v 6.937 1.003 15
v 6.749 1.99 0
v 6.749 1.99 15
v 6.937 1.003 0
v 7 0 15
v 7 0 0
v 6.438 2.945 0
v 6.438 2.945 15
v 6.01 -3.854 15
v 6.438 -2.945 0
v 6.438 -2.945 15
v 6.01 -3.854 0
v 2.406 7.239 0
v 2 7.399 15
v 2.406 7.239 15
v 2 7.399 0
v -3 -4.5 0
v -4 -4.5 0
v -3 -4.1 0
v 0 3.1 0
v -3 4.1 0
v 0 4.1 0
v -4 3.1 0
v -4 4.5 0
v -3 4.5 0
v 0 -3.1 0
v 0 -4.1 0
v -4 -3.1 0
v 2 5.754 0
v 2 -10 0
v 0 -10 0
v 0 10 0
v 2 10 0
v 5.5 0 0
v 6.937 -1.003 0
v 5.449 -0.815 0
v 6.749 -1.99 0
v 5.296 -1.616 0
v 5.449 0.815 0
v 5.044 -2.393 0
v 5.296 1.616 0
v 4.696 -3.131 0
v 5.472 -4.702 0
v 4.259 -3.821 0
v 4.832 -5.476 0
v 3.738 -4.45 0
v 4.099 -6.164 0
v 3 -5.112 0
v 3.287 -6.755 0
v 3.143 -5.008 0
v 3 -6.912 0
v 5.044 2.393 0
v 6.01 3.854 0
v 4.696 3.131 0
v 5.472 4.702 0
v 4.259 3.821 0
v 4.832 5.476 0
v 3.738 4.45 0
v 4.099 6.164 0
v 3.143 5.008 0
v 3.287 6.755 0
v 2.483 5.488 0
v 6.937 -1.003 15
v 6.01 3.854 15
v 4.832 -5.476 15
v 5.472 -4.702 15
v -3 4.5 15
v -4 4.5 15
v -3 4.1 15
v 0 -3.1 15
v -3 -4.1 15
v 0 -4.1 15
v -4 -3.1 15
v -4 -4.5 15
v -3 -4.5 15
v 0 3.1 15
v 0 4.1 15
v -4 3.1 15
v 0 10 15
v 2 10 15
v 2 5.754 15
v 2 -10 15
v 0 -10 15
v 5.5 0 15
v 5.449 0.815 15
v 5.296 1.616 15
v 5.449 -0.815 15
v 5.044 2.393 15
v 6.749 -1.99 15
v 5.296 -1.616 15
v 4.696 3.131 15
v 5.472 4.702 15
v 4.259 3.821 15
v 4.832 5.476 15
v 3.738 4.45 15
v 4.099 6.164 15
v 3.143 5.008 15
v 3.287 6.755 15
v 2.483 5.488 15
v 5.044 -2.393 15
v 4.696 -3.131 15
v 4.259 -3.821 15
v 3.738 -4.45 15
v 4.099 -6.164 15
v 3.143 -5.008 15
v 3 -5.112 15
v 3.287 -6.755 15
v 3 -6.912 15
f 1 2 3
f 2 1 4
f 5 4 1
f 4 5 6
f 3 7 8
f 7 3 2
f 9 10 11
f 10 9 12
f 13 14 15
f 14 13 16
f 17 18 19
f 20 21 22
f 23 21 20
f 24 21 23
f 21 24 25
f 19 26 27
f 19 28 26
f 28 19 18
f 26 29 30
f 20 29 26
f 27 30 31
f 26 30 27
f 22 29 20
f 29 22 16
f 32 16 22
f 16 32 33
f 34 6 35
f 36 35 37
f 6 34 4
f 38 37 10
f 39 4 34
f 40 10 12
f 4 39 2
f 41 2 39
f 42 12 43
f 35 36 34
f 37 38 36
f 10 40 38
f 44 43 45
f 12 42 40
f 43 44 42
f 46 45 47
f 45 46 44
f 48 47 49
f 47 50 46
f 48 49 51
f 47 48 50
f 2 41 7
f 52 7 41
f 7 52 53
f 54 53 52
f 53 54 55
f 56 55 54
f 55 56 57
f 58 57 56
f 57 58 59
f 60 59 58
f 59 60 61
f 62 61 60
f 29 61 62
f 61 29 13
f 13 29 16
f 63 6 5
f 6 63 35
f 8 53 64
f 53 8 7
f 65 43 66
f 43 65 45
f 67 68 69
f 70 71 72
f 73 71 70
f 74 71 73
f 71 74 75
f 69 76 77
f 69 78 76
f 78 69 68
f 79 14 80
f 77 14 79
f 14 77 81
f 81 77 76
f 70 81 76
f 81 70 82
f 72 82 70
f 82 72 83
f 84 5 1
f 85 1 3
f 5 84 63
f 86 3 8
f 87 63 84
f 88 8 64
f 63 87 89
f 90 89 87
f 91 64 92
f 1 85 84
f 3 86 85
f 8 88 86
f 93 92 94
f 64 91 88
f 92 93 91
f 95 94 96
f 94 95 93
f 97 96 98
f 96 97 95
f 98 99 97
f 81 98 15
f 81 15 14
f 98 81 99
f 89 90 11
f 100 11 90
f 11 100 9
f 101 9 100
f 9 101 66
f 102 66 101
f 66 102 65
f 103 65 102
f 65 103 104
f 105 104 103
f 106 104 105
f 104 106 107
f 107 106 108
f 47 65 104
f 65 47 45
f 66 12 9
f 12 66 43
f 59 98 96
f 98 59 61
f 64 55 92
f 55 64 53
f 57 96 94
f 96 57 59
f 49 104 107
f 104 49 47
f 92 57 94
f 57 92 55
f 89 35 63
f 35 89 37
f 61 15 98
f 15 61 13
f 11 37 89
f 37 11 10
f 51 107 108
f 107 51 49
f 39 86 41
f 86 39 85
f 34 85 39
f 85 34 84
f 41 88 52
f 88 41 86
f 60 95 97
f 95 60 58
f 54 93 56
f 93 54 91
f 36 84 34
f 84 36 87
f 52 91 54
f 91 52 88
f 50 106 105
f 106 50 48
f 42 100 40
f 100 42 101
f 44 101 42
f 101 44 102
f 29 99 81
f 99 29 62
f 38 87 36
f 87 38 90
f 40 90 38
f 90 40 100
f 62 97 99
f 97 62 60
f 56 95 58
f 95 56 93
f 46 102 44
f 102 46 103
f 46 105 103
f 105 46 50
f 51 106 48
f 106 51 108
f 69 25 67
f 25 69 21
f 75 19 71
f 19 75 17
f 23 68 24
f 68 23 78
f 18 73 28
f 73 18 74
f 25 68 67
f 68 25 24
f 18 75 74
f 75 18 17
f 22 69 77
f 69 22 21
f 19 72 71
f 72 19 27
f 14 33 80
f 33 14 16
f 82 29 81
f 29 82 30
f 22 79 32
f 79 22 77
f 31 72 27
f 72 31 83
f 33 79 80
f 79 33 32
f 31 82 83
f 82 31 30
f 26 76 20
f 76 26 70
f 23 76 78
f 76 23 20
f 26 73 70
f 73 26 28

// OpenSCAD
// file: ../src/lib/ALU_profile.scad
// Aleksandr Saechnikov 09 june 2015

ALU_profile(height=100, size=30);

module ALU_profile(size=30, height=10, radius=1.5, step=0.5) {
    echo(height);

	linear_extrude(height=height) {
		union() {
			sub_extrusion_profile(size, radius, step);
			rotate([0,0,90])  sub_extrusion_profile(size, radius, step);
			rotate([0,0,180]) sub_extrusion_profile(size, radius, step);
			rotate([0,0,270]) sub_extrusion_profile(size, radius, step);
		}
	}
    
    module sub_extrusion_profile(size=30, radius = 1.5, step=0.5) {

        reSize = size/30; // Scalling

        k0 = 0;
        k2 = 3.65*reSize;
        k1 = k2*cos(45);

        k3 = 4*reSize;
        k4 = 6*reSize;
        k5 = 8.25*reSize; k5_2 = k5 + k4 - k3;
        k6 = 12.8*reSize;
        k7 = 15*reSize;

        _radius = radius;// OR  *reSize -- Corner radius
        _step = step;    // OR  *reSize -- Step size

        polygon(points=[
            [k1,k1],[0,k2], // Center hole
            [0,k4],[k3,k4],[k5,k5_2],[k5,k6],[k3,k6],
            [k3,k7-_step],[k3+_step,k7-_step],[k3+_step,k7], //Step
            [k7-_radius,k7],[k7-_radius*(1.-cos(45)),k7-_radius*(1.-cos(45))],[k7,k7-_radius],// Corner
            [k7,k3+_step],[k7-_step,k3+_step],[k7-_step,k3], // Step
            [k6,k3],[k6,k5],[k5_2,k5],[k4,k3],[k4,0],
            [k2,0]  // Center hole
        ]);
    }
}
// file: ../src/888_5013.scad
include <../parameters.scad>
use <./lib/ALU_profile.scad>

module 888_5013() {
    difference() {
        union() {
            translate([-1/2-3, 0, 15/2])
            cube([1, 9, 15], center=true);
            
            translate([-5/2+1, 0, 15/2])
            cube([5, 8.2, 15], center=true);
            
            translate([1, 0, 15/2])
            cube([2, 20, 15], center=true);
            
            translate([-1, 0, 0])
            difference() {
                cylinder(d=16, h=15, $fn=50);
                
                translate([0, 0, -1])
                cylinder(d=13, h=17, $fn=50);
                
                translate([-20+2, -10, -1])
                cube([20, 20, 17]);
                
                translate([-20+4, -20, -1])
                cube([20, 20, 17]);
            }
        }
        
        translate([-5/2, 0, 16/2-.01])
        cube([5, 6.2, 16], center=true);
    }
}

888_5013();

#translate([-ALU_profile_width/2, 0, 0])
ALU_profile(height=30);
// file: ../parameters.scad
maximum_printable_size = 150;

layer_thickness = 0.3;
global_clearance = 0.5;


//Screw diameter and nut for M10 [mm]
M10_screw_diameter = 10.4;
M10_head_height = 10;
M10_head_diameter = 16+0.5;
M10_nut_height = 10.5;
M10_nut_diameter = 25.5;
M10_nut_pocket = 22.3;

//Screw diameter for M8 [mm]
M8_screw_diameter = 8.6;
M8_head_height = 8;
M8_head_diameter = 13.5;
M8_nut_height = 7.5;
M8_square_nut_thin_height = 4.5;
M8_nut_diameter = 14.4 + 0.5;
M8_nut_pocket = 13 + 0.5;
M8_washer_diameter = 16;
M8_washer_thickness = 1.5;


//Screw diameter and nut for M6 [mm]
M6_screw_diameter=6.5;
M6_head_diameter = 10+0.5;
M6_head_height = 6;
M6_nut_height = 4.9;
M6_nut_diameter = 11.8;
M6_nut_pocket = 10.4;
M6_square_nut_height = 3;
M6_square_nut_diameter = 10;
M6_washer_thickness = 1.6;

//Screw diameter and nut for M5 [mm]
M5_screw_diameter=5.5;
M5_head_height = 5;
M5_head_diameter = 13+0.5;
M5_nut_height = 4.5;
M5_nut_diameter = 9.4;
M5_nut_pocket = 8.4;

//Screw diameter and nut for M4 [mm]
M4_screw_diameter=4.5;
M4_screw_head_height = 4;
M4_nut_height = 3.2;
M4_nut_diameter = 8.4;
M4_nut_pocket = 7.5;

//Screw diameter and nut for M3 [mm]
M3_screw_diameter = 3.2;
M3_nut_height = 2.7;
M3_nut_diameter = 6.6;
M3_nut_pocket = 5.6;
M3_screw_head_height = 3;

//Screw diameter and nut for M2,5 [mm]
M2_5_screw_diameter = 2.7;
M2_5_nut_height = 2.3;
M2_5_nut_diameter = 6;
M2_5_nut_pocket = 5.5;

// kulove lozisko

bearing_efsm_08_h = 33+1;
bearing_efsm_08_m = 22;
bearing_efsm_08_db = 18;
bearing_efsm_08_ag = 10.5;
bearing_efsm_08_n = M4_screw_diameter;
bearing_efsm_08_a1 = 5.5;
bearing_efsm_08_d = 8.25;
bearing_efsm_08_B = 8; // ball height

bearing_efsm_10_h = 38+1;
bearing_efsm_10_m = 26;
bearing_efsm_10_db = 21.9;
bearing_efsm_10_ag = 12+0.2;
bearing_efsm_10_n = M5_screw_diameter;
bearing_efsm_10_a1 = 6.5;
bearing_efsm_10_d = 10.25;


bearing_efsm_12_width = 40+1;
bearing_efsm_12_h = bearing_efsm_12_width;
bearing_efsm_12_boltd = 28/2; // polovina vzdalenosti mezi srouby
bearing_efsm_12_m = bearing_efsm_12_boltd*2;
bearing_efsm_12_db = 25;
bearing_efsm_12_ag = 13;
bearing_efsm_12_a1 = 7;
bearing_efsm_12_n = M5_screw_diameter;
bearing_efsm_12_d = 12.15;
bearing_efsm_12_B = 10; // ball height
bearing_efsm_space = 1;

bearing_efsm_17_width = 54+1;
bearing_efsm_17_h = bearing_efsm_17_width;
bearing_efsm_17_boltd = 38/2; // polovina vzdalenosti mezi srouby
bearing_efsm_17_m = bearing_efsm_17_boltd*2;
bearing_efsm_17_db = 35;
bearing_efsm_17_ag = 18;
bearing_efsm_17_n = M6_screw_diameter;
bearing_efsm_17_a1 = 10;
bearing_efsm_17_B = 17; // ball height

//limcove lozisko
bearing_EFOM_10_L=26; //celkova sirka zakladny
bearing_EFOM_10_d1=10.3;//diametr otvoru real=10 mm
bearing_EFOM_10_dB=22;//diametr vystupku pro ulozeni lozika
bearing_EFOM_10_H=52;//celková delka zakladny
bearing_EFOM_10_J=36;// hole pitch
bearing_EFOM_10_A1=6.5;//vyska pouzdra
bearing_EFOM_10_Ag=12;//celkova vyska
bearing_EFOM_10_N1=5;//sirka otvoru pro sroub
bearing_EFOM_10_N2=8;//delka otvoru pro sroub
bearing_EFOM_10_m=36;//roztec der pro sroub
bearing_EFOM_10_h=9;//vyska lozika


608_bearing_outer_diameter = 22.3;
608_bearing_inner_diameter = 16;
608_bearing_thickness = 7.1;


// 20 KG servo parameters

servo_20kg_axis_offset = 9.375; // jak je osa mimo stredu
servo_20kg_body_x = 42;
servo_20kg_body_y = 21;
servo_20kg_body_z = 40;
servo_20kg_thread_x = 49/2;
servo_20kg_thread_y = 10/2;
servo_20kg_body_below = 10; // jak hluboko je tělo serva pod drzaky na srouby
servo_20kg_below = 25.8; // jak hluboko je páka serva pod drzaky na srouby

servo_20kg_bolt_d = 2.5+0.3;
servo_20kg_nut_d = 5+0.3;


//strain gauge
strain_gauge_width = 12.7;
strain_gauge_length = 75.1;
strain_gauge_screw_distance = 10;

//ALU profile
ALU_profile_width = 30.5;
ALU_profile_holder_wall_thickness = 3;
ALU_profile_groove_width = 8;

//pillow block bearing
//https://www.igus.eu/product/372
//Part no. KSTM-08
KSTM08_screws_distance = 33;         //m
KSTM08_screws_holes_diameter = 4.5;  //d2
KSTM08_flange_thickness = 6;         //h3
KSTM08_case_width = 9;               //C1
KSTM08_case_length = 47;             //a
KSTM08_ball_width = 12;              //B
KSTM08_ball_hole_diameter = 7.85;    //d1


//ložiska pro malý rotor
bearing_outer_diameter = 10.2;    // Rozměr B1 v nákresu s přídavkem na toleranci otvoru
bearing_thickness = 4;        // Rozměr B2 v nákresu
//bearing_shaft_length = 19.5;    // Rozměr B3 v nákresu, Originalni hodnota 19.5
bearing_shaft_length = 20;    // Rozměr B3 v nákresu


//parametry víčka s telemetrickou anténou
S01_sila_materialu=1.2;
S01_vyska_horni_zavit=10;
S01_hloubka_zavitu=4;
S01_prumer_vnitrni=50;
LO_spodni_prumer=17.2;
LO_vyska_bez_krytu=15;
S01_tolerance_zavit=1.5;
R01_vyska_prekryti_statoru=10;

g3_0_cone1 = 70;
g3_0_srcew_dist = 55;



// scale parameters
base_length = 500;
mid_base_width = 500;
mid_base_height = 200;
mid_base_length = 500;
mid_base_x_offset = 50;
base_mid_base_hinge_offset = 50;
tower_height = 185;
tower_angle = atan((mid_base_width/2-ALU_profile_width-10)/tower_height);
tower_arm_length = tower_height/cos(tower_angle);
tower_drag_z_offset = 22;
electro_box_length = 225;
electro_box_width = 165;
electro_box_height = 51.5;

// calibration device parameters
calibration_arm_x_offset = 140;
calibration_arm_y_offset = 50;
// main file
//@set_slicing_config(../slicing/default.ini)

include <../parameters.scad>
use <../src/888_5013.scad>

888_5013();
